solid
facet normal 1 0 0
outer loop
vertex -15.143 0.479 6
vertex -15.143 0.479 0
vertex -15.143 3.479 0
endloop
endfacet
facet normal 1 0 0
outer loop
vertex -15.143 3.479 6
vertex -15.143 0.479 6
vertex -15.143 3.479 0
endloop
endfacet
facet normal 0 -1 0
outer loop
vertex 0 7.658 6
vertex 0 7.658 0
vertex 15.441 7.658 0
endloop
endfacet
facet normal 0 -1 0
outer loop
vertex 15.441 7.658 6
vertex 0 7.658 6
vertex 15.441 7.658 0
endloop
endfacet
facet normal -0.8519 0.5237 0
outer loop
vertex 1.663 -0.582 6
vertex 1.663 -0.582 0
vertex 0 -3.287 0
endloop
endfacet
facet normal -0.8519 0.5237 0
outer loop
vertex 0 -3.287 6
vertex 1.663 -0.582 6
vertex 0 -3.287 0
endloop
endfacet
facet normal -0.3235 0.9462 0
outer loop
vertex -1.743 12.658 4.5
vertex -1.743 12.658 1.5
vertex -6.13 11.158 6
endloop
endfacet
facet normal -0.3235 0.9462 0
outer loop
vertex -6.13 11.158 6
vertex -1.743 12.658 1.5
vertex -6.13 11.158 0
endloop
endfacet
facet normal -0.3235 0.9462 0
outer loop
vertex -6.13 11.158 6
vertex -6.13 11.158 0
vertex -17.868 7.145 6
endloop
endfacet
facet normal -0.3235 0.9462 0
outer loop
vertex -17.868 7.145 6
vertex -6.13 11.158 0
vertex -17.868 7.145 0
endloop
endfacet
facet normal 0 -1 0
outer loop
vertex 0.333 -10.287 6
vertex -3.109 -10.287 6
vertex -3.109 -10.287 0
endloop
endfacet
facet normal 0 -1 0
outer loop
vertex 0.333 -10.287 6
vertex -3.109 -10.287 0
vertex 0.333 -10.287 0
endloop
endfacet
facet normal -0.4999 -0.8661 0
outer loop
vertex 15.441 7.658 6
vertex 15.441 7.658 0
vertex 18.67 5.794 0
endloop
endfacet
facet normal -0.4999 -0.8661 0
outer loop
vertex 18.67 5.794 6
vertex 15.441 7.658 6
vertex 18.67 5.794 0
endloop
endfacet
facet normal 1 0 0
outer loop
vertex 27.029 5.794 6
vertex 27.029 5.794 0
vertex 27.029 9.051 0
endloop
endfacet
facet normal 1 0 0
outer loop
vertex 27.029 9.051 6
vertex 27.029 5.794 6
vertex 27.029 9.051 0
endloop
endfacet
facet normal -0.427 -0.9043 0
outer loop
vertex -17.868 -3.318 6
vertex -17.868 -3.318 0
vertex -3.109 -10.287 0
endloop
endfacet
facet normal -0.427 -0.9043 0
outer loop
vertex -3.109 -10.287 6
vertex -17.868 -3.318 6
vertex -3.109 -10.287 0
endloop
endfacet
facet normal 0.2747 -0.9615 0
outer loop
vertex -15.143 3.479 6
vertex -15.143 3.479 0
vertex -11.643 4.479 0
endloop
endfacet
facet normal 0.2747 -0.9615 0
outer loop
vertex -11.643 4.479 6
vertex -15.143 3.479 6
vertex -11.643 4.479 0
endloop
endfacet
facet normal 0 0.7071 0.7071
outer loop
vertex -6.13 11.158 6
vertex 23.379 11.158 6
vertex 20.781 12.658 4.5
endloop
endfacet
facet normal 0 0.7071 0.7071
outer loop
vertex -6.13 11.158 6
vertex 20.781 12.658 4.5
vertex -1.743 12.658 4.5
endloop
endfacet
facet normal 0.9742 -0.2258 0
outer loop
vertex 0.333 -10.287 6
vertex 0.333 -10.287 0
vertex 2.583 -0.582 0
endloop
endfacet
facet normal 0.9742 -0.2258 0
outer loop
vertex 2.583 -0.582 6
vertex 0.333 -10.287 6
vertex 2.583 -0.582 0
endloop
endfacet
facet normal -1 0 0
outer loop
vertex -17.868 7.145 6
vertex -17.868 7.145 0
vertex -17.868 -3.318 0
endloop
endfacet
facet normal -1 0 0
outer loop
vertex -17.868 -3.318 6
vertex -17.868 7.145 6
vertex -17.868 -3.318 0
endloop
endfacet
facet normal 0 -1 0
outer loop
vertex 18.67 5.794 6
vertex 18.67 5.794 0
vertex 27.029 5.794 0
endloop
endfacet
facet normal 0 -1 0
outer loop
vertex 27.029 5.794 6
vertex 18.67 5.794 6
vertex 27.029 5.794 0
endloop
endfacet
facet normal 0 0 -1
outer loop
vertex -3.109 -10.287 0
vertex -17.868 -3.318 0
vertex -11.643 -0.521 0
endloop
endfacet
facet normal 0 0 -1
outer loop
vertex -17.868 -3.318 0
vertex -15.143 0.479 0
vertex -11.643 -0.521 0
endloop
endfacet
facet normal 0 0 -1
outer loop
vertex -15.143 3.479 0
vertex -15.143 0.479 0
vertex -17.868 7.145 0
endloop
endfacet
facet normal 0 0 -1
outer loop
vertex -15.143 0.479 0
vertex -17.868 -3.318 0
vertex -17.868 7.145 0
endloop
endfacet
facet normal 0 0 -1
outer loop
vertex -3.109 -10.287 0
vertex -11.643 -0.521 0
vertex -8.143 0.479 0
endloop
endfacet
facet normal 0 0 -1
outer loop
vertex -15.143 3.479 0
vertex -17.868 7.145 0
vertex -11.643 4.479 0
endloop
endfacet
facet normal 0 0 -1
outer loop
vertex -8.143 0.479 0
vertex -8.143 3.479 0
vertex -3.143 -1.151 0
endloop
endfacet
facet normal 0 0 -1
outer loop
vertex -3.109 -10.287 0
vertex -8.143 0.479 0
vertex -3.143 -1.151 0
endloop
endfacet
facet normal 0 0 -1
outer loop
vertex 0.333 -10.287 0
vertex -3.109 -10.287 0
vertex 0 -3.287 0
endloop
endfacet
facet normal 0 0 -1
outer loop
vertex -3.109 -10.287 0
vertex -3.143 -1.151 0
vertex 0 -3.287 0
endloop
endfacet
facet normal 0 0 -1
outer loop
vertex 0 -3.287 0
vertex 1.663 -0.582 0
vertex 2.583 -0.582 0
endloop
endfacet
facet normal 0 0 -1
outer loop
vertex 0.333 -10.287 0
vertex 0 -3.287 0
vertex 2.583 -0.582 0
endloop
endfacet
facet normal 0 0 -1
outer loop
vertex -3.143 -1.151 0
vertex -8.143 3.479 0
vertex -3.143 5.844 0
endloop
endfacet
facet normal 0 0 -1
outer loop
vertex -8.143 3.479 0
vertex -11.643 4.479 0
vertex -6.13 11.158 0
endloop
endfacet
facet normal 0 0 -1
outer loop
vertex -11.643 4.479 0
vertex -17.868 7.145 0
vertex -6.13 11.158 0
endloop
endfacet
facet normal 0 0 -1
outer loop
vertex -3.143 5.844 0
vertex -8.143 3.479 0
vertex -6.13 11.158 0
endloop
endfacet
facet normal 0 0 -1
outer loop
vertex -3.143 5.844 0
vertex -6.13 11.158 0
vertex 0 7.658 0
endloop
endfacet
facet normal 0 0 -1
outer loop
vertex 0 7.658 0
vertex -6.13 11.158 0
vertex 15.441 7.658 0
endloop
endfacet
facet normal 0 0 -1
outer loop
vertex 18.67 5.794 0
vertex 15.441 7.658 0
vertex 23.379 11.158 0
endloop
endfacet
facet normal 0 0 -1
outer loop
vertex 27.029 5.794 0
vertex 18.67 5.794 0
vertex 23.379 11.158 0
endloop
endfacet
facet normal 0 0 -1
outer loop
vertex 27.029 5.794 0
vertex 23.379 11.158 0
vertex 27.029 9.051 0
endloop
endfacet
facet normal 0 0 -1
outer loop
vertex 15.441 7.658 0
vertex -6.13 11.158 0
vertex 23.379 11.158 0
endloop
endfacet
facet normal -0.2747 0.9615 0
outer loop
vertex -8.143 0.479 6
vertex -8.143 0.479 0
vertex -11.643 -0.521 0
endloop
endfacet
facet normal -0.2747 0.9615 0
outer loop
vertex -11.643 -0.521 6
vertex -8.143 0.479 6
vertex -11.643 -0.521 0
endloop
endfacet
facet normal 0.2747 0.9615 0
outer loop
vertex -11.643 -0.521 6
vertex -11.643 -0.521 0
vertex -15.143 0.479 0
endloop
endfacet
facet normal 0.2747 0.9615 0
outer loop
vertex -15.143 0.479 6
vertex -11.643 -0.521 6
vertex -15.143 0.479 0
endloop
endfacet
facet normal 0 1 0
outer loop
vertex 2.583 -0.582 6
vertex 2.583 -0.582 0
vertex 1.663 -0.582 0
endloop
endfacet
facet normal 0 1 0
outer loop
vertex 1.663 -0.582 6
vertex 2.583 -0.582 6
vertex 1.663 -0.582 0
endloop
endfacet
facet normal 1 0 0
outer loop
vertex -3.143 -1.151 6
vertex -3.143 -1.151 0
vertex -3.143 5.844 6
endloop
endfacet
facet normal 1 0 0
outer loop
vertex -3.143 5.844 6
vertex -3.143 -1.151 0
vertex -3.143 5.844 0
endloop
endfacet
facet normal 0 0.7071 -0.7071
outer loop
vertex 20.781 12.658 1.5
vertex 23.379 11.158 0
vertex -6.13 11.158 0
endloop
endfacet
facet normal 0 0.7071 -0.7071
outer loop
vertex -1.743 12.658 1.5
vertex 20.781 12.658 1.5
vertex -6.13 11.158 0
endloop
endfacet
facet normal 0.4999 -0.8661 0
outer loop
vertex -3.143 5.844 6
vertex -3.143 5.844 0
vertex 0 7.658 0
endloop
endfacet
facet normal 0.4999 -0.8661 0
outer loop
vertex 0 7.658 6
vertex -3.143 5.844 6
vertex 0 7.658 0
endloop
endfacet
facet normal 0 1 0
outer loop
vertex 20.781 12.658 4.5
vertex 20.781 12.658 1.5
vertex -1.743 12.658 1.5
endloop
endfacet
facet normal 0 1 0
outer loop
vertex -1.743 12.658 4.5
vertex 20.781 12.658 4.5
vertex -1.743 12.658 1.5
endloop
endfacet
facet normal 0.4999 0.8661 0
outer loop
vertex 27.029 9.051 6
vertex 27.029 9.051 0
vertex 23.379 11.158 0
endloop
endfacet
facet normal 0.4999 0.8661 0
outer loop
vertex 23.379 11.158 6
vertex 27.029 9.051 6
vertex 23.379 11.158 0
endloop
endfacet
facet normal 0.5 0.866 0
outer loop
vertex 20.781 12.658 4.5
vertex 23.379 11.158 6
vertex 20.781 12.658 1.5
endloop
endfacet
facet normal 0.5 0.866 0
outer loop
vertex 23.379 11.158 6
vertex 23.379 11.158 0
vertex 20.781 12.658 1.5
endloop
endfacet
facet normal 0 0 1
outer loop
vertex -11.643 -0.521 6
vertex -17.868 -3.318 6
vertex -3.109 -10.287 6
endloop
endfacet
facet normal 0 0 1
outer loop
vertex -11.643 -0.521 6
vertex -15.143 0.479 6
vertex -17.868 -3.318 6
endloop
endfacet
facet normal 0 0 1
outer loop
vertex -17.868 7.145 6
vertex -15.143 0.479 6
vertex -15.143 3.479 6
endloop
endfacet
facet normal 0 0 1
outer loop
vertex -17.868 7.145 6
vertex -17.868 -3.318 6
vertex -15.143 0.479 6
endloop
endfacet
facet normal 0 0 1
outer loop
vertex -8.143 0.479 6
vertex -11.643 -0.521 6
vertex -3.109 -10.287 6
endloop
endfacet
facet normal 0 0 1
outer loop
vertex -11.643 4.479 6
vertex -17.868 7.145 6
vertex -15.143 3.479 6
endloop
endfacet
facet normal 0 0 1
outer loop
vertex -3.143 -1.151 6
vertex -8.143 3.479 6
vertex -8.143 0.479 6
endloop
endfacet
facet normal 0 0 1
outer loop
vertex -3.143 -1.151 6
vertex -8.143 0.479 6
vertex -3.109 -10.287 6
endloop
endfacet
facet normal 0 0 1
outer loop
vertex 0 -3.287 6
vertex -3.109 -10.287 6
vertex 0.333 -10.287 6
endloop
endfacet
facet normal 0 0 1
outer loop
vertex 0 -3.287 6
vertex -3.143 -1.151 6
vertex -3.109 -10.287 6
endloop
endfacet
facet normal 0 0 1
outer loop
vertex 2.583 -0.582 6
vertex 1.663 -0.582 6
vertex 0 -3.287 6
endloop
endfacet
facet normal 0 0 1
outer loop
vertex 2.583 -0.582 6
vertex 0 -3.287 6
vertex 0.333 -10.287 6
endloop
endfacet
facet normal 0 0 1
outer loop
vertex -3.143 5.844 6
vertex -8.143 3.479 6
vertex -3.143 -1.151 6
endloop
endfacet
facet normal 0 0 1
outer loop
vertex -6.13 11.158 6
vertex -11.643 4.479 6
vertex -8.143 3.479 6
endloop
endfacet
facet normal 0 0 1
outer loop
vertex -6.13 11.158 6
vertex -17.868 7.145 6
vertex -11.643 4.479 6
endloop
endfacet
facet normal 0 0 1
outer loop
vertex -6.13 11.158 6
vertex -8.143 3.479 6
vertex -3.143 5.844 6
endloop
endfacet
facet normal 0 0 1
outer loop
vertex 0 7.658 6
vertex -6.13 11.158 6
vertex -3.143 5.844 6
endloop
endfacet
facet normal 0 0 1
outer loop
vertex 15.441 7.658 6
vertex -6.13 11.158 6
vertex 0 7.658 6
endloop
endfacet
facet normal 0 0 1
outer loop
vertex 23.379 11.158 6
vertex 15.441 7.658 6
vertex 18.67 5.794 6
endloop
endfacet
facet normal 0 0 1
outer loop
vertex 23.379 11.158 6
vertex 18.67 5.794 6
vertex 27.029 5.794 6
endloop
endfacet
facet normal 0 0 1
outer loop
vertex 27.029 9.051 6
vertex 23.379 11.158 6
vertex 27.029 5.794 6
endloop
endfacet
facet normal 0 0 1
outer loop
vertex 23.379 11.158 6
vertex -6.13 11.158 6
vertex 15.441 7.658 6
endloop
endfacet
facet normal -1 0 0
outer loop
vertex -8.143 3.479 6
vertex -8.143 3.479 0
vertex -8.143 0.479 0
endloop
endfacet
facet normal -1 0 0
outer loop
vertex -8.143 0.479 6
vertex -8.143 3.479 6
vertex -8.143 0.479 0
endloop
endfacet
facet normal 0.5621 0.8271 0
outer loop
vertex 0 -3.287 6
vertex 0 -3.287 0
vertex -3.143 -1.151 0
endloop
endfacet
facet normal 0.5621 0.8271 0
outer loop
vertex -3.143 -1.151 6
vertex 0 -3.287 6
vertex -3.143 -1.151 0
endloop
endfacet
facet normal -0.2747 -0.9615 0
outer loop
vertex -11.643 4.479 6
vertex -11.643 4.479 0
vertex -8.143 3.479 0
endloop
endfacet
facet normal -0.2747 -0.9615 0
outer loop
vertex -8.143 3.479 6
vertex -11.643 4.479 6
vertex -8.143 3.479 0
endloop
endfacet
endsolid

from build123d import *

# Parameters (mm, degrees)
F1_DEPTH = 6
F2_SIZE  = 1.5


with BuildPart() as f1:
    # F0 (on Top) → F1 (new body)
    with BuildSketch(Plane.XY):
        Polygon((20.780653, 12.658395), (-1.74311, 12.658395), (-17.868141, 7.144866), (-17.868141, -2.784012), (-13.30795, -4.319267), (-3.109024, -10.286578), (0.33303, -10.286578), (2.583084, -0.582101), (1.663224, -0.582101), (0, -3.286578), (-3.143075, -1.150859), (-3.143075, 5.84374), (0, 7.658395), (15.440907, 7.658395), (18.67028, 5.793917), (27.028897, 5.793917), (27.028897, 9.05097), align=None)
        Polygon((-15.143075, 0.478634), (-15.143075, 3.478634), (-11.643075, 4.478634), (-8.143075, 3.478634), (-8.143075, 0.478634), (-11.643075, -0.521366), align=None, mode=Mode.SUBTRACT)
        Polygon((-13.30795, -4.319267), (-17.868141, -2.784012), (-17.868141, -3.318133), (-3.109024, -10.286578), align=None)
    extrude(amount=F1_DEPTH)

    # F2
    f2_edges = [f1.edges().sort_by_distance(p)[0] for p in [
        (9.518772, 12.658395, 6),
        (9.518772, 12.658395, 0),
    ]]
    chamfer(f2_edges, length=F2_SIZE)


solid = f1.part
